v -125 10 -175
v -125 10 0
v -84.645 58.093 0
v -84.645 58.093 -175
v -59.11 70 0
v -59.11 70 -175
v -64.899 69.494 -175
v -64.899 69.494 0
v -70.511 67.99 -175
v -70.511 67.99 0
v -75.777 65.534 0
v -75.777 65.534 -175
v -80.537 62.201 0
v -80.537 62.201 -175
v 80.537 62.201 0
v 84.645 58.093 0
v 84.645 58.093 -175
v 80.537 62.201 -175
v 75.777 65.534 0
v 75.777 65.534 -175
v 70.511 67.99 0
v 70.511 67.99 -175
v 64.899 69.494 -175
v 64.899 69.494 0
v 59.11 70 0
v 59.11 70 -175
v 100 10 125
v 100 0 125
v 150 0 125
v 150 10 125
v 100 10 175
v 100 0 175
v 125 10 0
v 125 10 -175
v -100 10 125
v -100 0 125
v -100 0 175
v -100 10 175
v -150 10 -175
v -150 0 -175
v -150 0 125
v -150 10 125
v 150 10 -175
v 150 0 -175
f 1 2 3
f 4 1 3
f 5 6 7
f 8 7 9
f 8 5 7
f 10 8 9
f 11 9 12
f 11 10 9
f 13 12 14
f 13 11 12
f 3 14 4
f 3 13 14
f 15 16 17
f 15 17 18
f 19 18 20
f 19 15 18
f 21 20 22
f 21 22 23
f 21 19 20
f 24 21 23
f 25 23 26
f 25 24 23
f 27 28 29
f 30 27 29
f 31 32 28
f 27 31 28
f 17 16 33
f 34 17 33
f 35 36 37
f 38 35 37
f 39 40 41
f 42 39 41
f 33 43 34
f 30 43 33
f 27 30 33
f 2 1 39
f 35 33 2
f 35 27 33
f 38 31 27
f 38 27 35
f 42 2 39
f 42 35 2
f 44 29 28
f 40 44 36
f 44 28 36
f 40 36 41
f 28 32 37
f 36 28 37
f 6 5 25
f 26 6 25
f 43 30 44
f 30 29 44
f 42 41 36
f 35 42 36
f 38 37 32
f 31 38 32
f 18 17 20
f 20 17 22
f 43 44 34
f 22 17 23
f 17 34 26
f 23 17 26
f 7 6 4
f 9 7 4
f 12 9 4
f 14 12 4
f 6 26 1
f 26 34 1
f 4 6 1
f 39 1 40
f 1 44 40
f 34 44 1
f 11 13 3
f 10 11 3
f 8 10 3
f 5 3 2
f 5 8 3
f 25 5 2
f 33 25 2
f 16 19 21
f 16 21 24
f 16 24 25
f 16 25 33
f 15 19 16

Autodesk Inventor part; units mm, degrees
ref_plane "YZ Plane" through (0, 0, 0) normal (1, 0, 0) x (0, 1, 0)
ref_plane "XZ Plane" through (0, 0, 0) normal (0, 1, 0) x (-1, 0, 0)
ref_plane "XY Plane" through (0, 0, 0) normal (0, 0, 1) x (1, 0, 0)
sketch "스케치1" plane through (0, 0, 0) normal (0, 1, 0) x (-1, 0, 0)
  line L0 (-150, 125) -> (-150, -175)
  line L1 (-150, -175) -> (150, -175)
  line L2 (150, -175) -> (150, 125)
  line L3 (150, 125) -> (100, 125)
  line L4 (100, 125) -> (100, 175)
  line L5 (100, 175) -> (-100, 175)
  line L6 (-100, 175) -> (-100, 125)
  line L7 (-100, 125) -> (-150, 125)
  point P0 (0, 0)
  dimension "d3" = 300
  dimension "d4" = 150
  dimension "d8" = 350
  dimension "d10" = 175
  dimension "d11" = 50
extrude "돌출1" add sketch "스케치1" along normal blind 10
sketch "스케치3" plane through (0, 0, 0) normal (0, 0, 1) x (1, 0, 0)
  line L0 (150, 10) -> (-150, 10) projected
  line L1 (-125, 10) -> (-84.6452, 58.0929)
  line L2 (-59.1104, 70) -> (59.1104, 70)
  line L3 (100, 0) -> (100, 10) projected
  line L4 (84.6452, 58.0929) -> (125, 10)
  line L5 (0, 0) -> (0, 70)
  arc A0 (-59.1104, 70) -> (-84.6452, 58.0929) centre (-59.1104, 36.6667) ccw
  arc A1 (84.6452, 58.0929) -> (59.1104, 70) centre (59.1104, 36.6667) ccw
  line L6 (125, 10) -> (-125, 10)
  point P0 (-74.654, 70)
  point P1 (74.654, 70)
  point P2 (125, 10)
  dimension "d15" = 130
  dimension "d17" = 33.3333
  dimension "d18" = 33.3333
  dimension "d19" = 300
  dimension "d22" = 250
  dimension "d24" = 60
  dimension "d25" = 0
sketch "스케치4" plane through (0, 0, 0) normal (1, 0, 0) x (0, 1, 0)
  line L0 (70, -175) -> (70, 59.1104)
  line L1 (58.0929, 84.6452) -> (10, 125)
  line L2 (10, 175) -> (10, 125) projected
  line L3 (10, -175) -> (10, 125) projected
  line L4 (70, -175) -> (10, -175)
  arc A0 (70, 59.1104) -> (58.0929, 84.6452) centre (36.6667, 59.1104) ccw
  point P0 (0, 0)
  dimension "d27" = 130
  dimension "d28" = 33.3333
  dimension "d29" = 60
extrude "돌출3" add sketch "스케치3" against normal up to surface (175 mm away)
sketch "스케치5" plane through (0, 10, 0) normal (0, 1, 0) x (1, 0, 0)
  line L0 (125, 175) -> (125, 0) projected
  line L1 (125, 0) -> (-125, 0) projected
  line L2 (-125, 0) -> (-125, 175) projected
  line L3 (-125, 175) -> (-150, 175) projected
  line L4 (-150, 175) -> (-150, -125) projected
  line L5 (-150, -125) -> (-100, -125) projected
  line L6 (-100, -125) -> (-100, -175) projected
  line L7 (-100, -175) -> (100, -175) projected
  line L8 (100, -175) -> (100, -125) projected
  line L9 (100, -125) -> (150, -125) projected
  line L10 (150, -125) -> (150, 175) projected
  line L11 (150, 175) -> (125, 175) projected
  line L12 (66, -151) -> (-66, -151)
  line L13 (-76, -141) -> (-76, -111)
  line L14 (-86, -101) -> (-116, -101)
  line L15 (-126, -91) -> (-126, -24)
  line L16 (-126, -24) -> (126, -24)
  line L17 (126, -24) -> (126, -91)
  line L18 (116, -101) -> (86, -101)
  line L19 (76, -111) -> (76, -141)
  arc A0 (86, -101) -> (76, -111) centre (86, -111) ccw
  arc A1 (-76, -111) -> (-86, -101) centre (-86, -111) ccw
  arc A2 (116, -101) -> (126, -91) centre (116, -91) ccw
  arc A3 (-126, -91) -> (-116, -101) centre (-116, -91) ccw
  arc A4 (-76, -141) -> (-66, -151) centre (-66, -141) ccw
  arc A5 (66, -151) -> (76, -141) centre (66, -141) ccw
  point P0 (0, 0)
  dimension "d34" = 24
  dimension "d35" = 10
  dimension "d36" = 10
equation "\"d4\" = 0.5 * d3"
equation "\"d10\" = 0.5 * d8"
equation "\"d17\" = 0.5 * d14"
equation "\"d18\" = d17"
equation "\"d22\" = 0.833333 * d19"
equation "\"d24\" = 0.2 * d19"
equation "\"d27\" = d15"
equation "\"d28\" = d17"
equation "\"d29\" = d24"
equation "\"d36\" = d35"
equation "\"d14\" = 0.333333 * d16"
equation "\"d16\" = 200"
properties part number "cap2"
